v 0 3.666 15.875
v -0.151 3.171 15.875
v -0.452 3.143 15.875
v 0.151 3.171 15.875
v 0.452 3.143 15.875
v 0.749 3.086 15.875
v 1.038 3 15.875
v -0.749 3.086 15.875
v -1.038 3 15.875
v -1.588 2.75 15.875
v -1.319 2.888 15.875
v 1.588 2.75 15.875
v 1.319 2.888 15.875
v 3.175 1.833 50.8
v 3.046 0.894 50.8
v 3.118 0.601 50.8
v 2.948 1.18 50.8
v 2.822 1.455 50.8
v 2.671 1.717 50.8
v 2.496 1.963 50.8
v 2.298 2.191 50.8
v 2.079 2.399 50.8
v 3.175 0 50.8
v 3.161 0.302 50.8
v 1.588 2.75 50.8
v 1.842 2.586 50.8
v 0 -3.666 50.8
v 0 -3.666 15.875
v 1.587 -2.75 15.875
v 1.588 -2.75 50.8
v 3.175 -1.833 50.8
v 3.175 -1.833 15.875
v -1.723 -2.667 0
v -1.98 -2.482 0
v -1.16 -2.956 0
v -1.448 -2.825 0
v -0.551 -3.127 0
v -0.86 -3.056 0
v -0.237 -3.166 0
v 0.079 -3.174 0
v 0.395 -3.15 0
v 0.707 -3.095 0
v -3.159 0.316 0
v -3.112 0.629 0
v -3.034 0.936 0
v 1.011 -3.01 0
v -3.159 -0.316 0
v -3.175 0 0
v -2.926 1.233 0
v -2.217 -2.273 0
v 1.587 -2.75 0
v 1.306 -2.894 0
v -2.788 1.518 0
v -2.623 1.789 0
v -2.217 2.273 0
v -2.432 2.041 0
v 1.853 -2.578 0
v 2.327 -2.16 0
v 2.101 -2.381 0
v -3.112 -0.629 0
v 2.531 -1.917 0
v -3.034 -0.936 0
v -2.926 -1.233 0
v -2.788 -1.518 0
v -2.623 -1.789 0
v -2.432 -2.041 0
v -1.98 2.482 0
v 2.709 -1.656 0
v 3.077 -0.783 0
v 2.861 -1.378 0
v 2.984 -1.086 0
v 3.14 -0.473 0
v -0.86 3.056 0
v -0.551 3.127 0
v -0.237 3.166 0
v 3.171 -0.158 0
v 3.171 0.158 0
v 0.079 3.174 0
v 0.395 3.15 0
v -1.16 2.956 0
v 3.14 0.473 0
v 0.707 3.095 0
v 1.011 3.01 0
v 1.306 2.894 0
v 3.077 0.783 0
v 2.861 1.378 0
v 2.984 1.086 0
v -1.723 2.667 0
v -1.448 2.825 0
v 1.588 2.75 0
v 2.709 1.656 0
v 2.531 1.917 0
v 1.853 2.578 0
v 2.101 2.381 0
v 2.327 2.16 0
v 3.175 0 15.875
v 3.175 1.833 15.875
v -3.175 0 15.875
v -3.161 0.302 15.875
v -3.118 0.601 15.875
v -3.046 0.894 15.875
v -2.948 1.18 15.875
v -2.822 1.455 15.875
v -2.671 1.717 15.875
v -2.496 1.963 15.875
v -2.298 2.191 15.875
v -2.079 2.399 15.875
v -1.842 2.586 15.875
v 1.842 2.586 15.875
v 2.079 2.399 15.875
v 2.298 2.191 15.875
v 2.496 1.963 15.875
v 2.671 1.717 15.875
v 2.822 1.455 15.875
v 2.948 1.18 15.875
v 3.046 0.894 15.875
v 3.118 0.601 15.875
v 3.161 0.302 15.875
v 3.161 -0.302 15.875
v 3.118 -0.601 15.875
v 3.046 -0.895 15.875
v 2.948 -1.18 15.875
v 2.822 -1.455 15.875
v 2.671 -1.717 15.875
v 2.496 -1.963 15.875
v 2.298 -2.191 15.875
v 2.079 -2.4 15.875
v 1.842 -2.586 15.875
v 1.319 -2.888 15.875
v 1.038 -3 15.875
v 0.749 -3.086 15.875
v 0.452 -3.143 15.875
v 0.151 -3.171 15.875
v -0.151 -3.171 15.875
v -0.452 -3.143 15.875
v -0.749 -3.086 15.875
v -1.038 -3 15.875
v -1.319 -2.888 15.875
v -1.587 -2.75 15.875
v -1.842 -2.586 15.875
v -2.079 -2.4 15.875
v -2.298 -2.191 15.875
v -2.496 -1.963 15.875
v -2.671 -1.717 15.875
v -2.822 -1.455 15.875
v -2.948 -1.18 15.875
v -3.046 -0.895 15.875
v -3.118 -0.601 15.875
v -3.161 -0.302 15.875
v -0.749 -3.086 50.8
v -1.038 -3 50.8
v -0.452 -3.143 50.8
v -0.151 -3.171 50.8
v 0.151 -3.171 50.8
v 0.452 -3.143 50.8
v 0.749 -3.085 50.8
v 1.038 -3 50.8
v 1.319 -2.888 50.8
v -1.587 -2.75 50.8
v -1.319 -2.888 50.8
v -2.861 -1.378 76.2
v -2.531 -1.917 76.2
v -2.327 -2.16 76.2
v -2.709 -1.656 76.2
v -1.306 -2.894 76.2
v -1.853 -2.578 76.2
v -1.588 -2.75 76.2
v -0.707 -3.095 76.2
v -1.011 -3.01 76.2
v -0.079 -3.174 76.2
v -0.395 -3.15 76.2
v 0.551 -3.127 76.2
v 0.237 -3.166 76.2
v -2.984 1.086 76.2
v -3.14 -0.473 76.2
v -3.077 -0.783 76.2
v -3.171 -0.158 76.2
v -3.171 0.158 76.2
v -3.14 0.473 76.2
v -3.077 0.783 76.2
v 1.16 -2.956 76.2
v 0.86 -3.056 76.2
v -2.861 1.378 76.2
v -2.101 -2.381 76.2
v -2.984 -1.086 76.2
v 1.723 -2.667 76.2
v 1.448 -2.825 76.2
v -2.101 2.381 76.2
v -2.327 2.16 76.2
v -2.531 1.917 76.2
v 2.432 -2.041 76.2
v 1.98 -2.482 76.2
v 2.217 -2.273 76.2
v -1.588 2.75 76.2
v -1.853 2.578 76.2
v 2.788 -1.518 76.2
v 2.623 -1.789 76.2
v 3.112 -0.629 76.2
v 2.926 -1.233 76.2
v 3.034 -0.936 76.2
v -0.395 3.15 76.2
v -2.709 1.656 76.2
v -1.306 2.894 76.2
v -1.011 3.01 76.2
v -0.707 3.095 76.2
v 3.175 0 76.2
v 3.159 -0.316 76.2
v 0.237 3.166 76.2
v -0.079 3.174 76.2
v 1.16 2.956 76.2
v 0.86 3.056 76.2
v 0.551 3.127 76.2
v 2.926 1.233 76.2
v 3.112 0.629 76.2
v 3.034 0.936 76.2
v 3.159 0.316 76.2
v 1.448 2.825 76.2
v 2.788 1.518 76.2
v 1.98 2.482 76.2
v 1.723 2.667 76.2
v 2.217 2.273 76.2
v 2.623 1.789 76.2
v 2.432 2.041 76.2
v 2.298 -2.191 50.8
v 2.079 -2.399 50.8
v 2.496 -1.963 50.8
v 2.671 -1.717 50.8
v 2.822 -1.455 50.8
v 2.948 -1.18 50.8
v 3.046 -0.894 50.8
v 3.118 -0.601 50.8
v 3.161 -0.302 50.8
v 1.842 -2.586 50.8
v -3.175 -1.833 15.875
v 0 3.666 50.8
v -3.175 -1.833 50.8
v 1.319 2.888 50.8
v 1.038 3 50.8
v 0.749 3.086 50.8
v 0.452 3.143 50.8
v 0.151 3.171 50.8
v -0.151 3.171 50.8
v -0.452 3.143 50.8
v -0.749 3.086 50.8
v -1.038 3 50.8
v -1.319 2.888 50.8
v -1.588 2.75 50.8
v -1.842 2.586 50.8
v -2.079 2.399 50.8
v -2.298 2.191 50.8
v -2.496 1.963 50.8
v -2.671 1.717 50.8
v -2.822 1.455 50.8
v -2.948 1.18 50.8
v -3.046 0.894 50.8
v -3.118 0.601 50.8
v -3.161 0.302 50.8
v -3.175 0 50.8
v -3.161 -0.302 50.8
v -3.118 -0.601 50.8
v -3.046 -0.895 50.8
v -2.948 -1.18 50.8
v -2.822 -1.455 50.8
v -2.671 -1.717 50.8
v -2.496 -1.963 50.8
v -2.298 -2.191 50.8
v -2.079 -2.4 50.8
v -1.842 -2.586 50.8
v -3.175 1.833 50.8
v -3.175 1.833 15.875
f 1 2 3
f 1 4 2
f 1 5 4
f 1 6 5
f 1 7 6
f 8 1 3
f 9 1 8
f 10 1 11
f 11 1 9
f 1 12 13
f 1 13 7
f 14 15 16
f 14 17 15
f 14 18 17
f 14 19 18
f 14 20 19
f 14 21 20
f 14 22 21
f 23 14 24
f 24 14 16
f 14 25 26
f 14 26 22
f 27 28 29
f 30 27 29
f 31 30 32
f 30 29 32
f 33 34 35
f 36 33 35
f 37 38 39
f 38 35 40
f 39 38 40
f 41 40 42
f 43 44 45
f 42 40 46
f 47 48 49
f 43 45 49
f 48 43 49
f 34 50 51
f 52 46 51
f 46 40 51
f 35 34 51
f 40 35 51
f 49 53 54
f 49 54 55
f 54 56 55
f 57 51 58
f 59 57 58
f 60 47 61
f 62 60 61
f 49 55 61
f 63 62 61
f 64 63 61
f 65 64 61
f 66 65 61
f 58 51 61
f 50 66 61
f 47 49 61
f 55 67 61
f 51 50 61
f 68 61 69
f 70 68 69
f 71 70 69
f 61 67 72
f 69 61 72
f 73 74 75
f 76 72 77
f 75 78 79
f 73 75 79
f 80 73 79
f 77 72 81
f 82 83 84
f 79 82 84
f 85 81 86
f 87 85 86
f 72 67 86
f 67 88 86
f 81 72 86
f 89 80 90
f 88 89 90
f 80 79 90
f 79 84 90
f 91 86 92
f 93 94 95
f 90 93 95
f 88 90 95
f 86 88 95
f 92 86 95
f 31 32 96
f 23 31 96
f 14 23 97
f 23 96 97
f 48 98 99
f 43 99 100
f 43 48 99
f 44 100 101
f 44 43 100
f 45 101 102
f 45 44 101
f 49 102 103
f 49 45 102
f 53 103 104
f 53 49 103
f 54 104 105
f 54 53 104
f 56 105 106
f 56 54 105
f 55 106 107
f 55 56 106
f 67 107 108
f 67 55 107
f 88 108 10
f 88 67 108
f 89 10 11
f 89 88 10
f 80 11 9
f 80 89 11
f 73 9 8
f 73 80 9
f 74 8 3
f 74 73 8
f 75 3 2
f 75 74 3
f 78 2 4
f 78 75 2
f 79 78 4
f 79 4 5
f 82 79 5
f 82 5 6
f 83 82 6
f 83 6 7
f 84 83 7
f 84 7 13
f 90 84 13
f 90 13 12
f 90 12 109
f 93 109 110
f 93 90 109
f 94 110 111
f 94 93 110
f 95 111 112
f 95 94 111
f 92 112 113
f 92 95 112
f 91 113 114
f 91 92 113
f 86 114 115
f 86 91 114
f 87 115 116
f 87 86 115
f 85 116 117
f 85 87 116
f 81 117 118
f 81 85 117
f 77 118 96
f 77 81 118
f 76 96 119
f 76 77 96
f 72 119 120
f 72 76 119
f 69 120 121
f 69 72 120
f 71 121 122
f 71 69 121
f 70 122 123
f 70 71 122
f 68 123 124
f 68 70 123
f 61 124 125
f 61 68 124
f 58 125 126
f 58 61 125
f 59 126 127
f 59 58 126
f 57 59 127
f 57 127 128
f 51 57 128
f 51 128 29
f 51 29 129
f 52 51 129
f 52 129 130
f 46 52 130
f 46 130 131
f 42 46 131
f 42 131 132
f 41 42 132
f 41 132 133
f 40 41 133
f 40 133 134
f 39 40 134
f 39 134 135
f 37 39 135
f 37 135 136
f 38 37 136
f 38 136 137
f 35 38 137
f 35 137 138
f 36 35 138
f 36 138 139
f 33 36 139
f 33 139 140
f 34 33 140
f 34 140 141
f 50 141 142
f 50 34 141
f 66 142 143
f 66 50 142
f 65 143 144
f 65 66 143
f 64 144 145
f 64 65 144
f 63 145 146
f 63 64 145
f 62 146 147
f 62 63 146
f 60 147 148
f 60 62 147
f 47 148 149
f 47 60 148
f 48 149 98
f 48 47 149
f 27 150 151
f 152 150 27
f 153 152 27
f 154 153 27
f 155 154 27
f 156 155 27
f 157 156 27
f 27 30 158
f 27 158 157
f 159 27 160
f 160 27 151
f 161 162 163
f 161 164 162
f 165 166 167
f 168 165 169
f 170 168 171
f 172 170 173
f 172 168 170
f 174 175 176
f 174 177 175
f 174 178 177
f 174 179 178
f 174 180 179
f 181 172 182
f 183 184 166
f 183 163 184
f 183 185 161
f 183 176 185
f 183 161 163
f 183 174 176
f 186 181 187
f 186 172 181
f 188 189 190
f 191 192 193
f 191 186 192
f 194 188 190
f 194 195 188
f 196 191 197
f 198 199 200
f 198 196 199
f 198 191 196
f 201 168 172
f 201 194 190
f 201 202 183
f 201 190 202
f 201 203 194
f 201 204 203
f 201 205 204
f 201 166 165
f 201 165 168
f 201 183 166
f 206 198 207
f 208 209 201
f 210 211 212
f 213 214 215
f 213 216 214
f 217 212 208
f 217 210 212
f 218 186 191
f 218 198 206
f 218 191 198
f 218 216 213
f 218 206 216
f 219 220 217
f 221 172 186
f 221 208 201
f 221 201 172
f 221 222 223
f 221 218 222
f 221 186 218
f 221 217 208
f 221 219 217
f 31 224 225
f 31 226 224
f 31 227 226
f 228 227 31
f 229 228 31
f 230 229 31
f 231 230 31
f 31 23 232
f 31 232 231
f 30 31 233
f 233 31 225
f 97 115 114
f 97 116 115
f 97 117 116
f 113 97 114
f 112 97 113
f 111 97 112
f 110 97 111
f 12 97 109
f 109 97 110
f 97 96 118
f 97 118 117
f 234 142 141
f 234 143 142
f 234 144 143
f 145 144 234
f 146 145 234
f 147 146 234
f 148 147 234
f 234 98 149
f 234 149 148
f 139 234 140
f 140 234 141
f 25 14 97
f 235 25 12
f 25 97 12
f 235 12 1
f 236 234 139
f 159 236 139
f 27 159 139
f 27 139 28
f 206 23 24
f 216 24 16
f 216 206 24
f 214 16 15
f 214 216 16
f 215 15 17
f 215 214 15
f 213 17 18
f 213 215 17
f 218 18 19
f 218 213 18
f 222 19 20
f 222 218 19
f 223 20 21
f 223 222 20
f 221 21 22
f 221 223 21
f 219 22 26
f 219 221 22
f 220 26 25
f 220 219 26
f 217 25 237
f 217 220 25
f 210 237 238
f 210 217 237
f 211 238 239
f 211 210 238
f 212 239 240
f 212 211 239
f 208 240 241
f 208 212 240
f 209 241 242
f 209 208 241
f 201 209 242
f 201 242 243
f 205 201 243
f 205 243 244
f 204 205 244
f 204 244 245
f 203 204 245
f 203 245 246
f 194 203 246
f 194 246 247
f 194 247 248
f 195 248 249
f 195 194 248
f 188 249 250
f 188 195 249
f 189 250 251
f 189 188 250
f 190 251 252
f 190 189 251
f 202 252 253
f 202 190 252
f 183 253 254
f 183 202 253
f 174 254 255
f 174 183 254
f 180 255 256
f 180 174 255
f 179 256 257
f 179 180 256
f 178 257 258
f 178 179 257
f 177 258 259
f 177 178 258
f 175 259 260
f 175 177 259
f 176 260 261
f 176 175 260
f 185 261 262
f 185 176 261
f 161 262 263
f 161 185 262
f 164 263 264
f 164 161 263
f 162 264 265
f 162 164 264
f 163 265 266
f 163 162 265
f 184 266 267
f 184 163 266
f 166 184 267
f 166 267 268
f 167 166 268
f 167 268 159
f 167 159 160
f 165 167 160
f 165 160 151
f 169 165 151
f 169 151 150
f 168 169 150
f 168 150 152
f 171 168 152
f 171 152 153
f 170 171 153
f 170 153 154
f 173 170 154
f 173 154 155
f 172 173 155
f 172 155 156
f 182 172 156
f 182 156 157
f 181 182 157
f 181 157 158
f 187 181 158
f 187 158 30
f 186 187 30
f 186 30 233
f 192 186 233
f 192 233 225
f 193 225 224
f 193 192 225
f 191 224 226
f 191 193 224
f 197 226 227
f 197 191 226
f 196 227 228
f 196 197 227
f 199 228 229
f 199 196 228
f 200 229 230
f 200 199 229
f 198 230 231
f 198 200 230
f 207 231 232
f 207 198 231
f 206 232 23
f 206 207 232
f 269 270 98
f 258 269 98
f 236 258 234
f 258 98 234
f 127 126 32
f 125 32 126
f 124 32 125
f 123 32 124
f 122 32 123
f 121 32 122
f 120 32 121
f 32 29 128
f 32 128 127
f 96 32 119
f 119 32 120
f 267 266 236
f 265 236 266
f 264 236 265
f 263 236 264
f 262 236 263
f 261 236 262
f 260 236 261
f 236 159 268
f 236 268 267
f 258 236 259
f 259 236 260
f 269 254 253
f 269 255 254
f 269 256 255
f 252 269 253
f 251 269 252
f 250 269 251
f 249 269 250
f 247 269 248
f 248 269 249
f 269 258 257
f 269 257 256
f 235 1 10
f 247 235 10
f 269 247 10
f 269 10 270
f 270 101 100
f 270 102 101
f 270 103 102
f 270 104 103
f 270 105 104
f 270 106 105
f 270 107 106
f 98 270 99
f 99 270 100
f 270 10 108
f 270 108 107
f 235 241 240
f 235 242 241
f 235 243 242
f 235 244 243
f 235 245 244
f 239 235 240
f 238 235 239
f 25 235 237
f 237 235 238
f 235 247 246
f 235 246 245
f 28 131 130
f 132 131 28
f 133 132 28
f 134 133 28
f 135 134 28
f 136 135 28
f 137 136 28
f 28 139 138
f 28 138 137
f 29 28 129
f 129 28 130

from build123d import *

# Parameters (mm, degrees)
BOSS_EXTRUDE1_DEPTH = 76.2
SKETCH3_OUTSIDE_W   = 23.712
SKETCH3_OUTSIDE_H   = 24.694
SKETCH3_OUTSIDE_R   = 3.175
CUT_EXTRUDE1_DEPTH  = 25.4
SKETCH4_OUTSIDE_W   = 23.712
SKETCH4_OUTSIDE_H   = 24.694
SKETCH4_OUTSIDE_R   = 3.175
CUT_EXTRUDE2_DEPTH  = 15.875


with BuildPart() as part:
    # Sketch2 → Boss-Extrude1 (new body)
    with BuildSketch(Plane.XY):
        Polygon((0, 3.666174209), (-3.175, 1.833087105), (-3.175, -1.833087105), (0, -3.666174209), (3.175, -1.833087105), (3.175, 1.833087105), align=None)
    extrude(amount=BOSS_EXTRUDE1_DEPTH)

    # Sketch3 outside → Cut-Extrude1 (cut)
    with BuildSketch(Plane.XY.offset(76.2)):
        Rectangle(SKETCH3_OUTSIDE_W, SKETCH3_OUTSIDE_H)
        Circle(SKETCH3_OUTSIDE_R, mode=Mode.SUBTRACT)
    extrude(amount=-CUT_EXTRUDE1_DEPTH, mode=Mode.SUBTRACT)

    # Sketch4 outside → Cut-Extrude2 (cut)
    with BuildSketch(Plane(origin=(0, 0, 0), x_dir=(-1, 0, 0), z_dir=(0, 0, -1))):
        Rectangle(SKETCH4_OUTSIDE_W, SKETCH4_OUTSIDE_H)
        Circle(SKETCH4_OUTSIDE_R, mode=Mode.SUBTRACT)
    extrude(amount=-CUT_EXTRUDE2_DEPTH, mode=Mode.SUBTRACT)


solid = part.part
